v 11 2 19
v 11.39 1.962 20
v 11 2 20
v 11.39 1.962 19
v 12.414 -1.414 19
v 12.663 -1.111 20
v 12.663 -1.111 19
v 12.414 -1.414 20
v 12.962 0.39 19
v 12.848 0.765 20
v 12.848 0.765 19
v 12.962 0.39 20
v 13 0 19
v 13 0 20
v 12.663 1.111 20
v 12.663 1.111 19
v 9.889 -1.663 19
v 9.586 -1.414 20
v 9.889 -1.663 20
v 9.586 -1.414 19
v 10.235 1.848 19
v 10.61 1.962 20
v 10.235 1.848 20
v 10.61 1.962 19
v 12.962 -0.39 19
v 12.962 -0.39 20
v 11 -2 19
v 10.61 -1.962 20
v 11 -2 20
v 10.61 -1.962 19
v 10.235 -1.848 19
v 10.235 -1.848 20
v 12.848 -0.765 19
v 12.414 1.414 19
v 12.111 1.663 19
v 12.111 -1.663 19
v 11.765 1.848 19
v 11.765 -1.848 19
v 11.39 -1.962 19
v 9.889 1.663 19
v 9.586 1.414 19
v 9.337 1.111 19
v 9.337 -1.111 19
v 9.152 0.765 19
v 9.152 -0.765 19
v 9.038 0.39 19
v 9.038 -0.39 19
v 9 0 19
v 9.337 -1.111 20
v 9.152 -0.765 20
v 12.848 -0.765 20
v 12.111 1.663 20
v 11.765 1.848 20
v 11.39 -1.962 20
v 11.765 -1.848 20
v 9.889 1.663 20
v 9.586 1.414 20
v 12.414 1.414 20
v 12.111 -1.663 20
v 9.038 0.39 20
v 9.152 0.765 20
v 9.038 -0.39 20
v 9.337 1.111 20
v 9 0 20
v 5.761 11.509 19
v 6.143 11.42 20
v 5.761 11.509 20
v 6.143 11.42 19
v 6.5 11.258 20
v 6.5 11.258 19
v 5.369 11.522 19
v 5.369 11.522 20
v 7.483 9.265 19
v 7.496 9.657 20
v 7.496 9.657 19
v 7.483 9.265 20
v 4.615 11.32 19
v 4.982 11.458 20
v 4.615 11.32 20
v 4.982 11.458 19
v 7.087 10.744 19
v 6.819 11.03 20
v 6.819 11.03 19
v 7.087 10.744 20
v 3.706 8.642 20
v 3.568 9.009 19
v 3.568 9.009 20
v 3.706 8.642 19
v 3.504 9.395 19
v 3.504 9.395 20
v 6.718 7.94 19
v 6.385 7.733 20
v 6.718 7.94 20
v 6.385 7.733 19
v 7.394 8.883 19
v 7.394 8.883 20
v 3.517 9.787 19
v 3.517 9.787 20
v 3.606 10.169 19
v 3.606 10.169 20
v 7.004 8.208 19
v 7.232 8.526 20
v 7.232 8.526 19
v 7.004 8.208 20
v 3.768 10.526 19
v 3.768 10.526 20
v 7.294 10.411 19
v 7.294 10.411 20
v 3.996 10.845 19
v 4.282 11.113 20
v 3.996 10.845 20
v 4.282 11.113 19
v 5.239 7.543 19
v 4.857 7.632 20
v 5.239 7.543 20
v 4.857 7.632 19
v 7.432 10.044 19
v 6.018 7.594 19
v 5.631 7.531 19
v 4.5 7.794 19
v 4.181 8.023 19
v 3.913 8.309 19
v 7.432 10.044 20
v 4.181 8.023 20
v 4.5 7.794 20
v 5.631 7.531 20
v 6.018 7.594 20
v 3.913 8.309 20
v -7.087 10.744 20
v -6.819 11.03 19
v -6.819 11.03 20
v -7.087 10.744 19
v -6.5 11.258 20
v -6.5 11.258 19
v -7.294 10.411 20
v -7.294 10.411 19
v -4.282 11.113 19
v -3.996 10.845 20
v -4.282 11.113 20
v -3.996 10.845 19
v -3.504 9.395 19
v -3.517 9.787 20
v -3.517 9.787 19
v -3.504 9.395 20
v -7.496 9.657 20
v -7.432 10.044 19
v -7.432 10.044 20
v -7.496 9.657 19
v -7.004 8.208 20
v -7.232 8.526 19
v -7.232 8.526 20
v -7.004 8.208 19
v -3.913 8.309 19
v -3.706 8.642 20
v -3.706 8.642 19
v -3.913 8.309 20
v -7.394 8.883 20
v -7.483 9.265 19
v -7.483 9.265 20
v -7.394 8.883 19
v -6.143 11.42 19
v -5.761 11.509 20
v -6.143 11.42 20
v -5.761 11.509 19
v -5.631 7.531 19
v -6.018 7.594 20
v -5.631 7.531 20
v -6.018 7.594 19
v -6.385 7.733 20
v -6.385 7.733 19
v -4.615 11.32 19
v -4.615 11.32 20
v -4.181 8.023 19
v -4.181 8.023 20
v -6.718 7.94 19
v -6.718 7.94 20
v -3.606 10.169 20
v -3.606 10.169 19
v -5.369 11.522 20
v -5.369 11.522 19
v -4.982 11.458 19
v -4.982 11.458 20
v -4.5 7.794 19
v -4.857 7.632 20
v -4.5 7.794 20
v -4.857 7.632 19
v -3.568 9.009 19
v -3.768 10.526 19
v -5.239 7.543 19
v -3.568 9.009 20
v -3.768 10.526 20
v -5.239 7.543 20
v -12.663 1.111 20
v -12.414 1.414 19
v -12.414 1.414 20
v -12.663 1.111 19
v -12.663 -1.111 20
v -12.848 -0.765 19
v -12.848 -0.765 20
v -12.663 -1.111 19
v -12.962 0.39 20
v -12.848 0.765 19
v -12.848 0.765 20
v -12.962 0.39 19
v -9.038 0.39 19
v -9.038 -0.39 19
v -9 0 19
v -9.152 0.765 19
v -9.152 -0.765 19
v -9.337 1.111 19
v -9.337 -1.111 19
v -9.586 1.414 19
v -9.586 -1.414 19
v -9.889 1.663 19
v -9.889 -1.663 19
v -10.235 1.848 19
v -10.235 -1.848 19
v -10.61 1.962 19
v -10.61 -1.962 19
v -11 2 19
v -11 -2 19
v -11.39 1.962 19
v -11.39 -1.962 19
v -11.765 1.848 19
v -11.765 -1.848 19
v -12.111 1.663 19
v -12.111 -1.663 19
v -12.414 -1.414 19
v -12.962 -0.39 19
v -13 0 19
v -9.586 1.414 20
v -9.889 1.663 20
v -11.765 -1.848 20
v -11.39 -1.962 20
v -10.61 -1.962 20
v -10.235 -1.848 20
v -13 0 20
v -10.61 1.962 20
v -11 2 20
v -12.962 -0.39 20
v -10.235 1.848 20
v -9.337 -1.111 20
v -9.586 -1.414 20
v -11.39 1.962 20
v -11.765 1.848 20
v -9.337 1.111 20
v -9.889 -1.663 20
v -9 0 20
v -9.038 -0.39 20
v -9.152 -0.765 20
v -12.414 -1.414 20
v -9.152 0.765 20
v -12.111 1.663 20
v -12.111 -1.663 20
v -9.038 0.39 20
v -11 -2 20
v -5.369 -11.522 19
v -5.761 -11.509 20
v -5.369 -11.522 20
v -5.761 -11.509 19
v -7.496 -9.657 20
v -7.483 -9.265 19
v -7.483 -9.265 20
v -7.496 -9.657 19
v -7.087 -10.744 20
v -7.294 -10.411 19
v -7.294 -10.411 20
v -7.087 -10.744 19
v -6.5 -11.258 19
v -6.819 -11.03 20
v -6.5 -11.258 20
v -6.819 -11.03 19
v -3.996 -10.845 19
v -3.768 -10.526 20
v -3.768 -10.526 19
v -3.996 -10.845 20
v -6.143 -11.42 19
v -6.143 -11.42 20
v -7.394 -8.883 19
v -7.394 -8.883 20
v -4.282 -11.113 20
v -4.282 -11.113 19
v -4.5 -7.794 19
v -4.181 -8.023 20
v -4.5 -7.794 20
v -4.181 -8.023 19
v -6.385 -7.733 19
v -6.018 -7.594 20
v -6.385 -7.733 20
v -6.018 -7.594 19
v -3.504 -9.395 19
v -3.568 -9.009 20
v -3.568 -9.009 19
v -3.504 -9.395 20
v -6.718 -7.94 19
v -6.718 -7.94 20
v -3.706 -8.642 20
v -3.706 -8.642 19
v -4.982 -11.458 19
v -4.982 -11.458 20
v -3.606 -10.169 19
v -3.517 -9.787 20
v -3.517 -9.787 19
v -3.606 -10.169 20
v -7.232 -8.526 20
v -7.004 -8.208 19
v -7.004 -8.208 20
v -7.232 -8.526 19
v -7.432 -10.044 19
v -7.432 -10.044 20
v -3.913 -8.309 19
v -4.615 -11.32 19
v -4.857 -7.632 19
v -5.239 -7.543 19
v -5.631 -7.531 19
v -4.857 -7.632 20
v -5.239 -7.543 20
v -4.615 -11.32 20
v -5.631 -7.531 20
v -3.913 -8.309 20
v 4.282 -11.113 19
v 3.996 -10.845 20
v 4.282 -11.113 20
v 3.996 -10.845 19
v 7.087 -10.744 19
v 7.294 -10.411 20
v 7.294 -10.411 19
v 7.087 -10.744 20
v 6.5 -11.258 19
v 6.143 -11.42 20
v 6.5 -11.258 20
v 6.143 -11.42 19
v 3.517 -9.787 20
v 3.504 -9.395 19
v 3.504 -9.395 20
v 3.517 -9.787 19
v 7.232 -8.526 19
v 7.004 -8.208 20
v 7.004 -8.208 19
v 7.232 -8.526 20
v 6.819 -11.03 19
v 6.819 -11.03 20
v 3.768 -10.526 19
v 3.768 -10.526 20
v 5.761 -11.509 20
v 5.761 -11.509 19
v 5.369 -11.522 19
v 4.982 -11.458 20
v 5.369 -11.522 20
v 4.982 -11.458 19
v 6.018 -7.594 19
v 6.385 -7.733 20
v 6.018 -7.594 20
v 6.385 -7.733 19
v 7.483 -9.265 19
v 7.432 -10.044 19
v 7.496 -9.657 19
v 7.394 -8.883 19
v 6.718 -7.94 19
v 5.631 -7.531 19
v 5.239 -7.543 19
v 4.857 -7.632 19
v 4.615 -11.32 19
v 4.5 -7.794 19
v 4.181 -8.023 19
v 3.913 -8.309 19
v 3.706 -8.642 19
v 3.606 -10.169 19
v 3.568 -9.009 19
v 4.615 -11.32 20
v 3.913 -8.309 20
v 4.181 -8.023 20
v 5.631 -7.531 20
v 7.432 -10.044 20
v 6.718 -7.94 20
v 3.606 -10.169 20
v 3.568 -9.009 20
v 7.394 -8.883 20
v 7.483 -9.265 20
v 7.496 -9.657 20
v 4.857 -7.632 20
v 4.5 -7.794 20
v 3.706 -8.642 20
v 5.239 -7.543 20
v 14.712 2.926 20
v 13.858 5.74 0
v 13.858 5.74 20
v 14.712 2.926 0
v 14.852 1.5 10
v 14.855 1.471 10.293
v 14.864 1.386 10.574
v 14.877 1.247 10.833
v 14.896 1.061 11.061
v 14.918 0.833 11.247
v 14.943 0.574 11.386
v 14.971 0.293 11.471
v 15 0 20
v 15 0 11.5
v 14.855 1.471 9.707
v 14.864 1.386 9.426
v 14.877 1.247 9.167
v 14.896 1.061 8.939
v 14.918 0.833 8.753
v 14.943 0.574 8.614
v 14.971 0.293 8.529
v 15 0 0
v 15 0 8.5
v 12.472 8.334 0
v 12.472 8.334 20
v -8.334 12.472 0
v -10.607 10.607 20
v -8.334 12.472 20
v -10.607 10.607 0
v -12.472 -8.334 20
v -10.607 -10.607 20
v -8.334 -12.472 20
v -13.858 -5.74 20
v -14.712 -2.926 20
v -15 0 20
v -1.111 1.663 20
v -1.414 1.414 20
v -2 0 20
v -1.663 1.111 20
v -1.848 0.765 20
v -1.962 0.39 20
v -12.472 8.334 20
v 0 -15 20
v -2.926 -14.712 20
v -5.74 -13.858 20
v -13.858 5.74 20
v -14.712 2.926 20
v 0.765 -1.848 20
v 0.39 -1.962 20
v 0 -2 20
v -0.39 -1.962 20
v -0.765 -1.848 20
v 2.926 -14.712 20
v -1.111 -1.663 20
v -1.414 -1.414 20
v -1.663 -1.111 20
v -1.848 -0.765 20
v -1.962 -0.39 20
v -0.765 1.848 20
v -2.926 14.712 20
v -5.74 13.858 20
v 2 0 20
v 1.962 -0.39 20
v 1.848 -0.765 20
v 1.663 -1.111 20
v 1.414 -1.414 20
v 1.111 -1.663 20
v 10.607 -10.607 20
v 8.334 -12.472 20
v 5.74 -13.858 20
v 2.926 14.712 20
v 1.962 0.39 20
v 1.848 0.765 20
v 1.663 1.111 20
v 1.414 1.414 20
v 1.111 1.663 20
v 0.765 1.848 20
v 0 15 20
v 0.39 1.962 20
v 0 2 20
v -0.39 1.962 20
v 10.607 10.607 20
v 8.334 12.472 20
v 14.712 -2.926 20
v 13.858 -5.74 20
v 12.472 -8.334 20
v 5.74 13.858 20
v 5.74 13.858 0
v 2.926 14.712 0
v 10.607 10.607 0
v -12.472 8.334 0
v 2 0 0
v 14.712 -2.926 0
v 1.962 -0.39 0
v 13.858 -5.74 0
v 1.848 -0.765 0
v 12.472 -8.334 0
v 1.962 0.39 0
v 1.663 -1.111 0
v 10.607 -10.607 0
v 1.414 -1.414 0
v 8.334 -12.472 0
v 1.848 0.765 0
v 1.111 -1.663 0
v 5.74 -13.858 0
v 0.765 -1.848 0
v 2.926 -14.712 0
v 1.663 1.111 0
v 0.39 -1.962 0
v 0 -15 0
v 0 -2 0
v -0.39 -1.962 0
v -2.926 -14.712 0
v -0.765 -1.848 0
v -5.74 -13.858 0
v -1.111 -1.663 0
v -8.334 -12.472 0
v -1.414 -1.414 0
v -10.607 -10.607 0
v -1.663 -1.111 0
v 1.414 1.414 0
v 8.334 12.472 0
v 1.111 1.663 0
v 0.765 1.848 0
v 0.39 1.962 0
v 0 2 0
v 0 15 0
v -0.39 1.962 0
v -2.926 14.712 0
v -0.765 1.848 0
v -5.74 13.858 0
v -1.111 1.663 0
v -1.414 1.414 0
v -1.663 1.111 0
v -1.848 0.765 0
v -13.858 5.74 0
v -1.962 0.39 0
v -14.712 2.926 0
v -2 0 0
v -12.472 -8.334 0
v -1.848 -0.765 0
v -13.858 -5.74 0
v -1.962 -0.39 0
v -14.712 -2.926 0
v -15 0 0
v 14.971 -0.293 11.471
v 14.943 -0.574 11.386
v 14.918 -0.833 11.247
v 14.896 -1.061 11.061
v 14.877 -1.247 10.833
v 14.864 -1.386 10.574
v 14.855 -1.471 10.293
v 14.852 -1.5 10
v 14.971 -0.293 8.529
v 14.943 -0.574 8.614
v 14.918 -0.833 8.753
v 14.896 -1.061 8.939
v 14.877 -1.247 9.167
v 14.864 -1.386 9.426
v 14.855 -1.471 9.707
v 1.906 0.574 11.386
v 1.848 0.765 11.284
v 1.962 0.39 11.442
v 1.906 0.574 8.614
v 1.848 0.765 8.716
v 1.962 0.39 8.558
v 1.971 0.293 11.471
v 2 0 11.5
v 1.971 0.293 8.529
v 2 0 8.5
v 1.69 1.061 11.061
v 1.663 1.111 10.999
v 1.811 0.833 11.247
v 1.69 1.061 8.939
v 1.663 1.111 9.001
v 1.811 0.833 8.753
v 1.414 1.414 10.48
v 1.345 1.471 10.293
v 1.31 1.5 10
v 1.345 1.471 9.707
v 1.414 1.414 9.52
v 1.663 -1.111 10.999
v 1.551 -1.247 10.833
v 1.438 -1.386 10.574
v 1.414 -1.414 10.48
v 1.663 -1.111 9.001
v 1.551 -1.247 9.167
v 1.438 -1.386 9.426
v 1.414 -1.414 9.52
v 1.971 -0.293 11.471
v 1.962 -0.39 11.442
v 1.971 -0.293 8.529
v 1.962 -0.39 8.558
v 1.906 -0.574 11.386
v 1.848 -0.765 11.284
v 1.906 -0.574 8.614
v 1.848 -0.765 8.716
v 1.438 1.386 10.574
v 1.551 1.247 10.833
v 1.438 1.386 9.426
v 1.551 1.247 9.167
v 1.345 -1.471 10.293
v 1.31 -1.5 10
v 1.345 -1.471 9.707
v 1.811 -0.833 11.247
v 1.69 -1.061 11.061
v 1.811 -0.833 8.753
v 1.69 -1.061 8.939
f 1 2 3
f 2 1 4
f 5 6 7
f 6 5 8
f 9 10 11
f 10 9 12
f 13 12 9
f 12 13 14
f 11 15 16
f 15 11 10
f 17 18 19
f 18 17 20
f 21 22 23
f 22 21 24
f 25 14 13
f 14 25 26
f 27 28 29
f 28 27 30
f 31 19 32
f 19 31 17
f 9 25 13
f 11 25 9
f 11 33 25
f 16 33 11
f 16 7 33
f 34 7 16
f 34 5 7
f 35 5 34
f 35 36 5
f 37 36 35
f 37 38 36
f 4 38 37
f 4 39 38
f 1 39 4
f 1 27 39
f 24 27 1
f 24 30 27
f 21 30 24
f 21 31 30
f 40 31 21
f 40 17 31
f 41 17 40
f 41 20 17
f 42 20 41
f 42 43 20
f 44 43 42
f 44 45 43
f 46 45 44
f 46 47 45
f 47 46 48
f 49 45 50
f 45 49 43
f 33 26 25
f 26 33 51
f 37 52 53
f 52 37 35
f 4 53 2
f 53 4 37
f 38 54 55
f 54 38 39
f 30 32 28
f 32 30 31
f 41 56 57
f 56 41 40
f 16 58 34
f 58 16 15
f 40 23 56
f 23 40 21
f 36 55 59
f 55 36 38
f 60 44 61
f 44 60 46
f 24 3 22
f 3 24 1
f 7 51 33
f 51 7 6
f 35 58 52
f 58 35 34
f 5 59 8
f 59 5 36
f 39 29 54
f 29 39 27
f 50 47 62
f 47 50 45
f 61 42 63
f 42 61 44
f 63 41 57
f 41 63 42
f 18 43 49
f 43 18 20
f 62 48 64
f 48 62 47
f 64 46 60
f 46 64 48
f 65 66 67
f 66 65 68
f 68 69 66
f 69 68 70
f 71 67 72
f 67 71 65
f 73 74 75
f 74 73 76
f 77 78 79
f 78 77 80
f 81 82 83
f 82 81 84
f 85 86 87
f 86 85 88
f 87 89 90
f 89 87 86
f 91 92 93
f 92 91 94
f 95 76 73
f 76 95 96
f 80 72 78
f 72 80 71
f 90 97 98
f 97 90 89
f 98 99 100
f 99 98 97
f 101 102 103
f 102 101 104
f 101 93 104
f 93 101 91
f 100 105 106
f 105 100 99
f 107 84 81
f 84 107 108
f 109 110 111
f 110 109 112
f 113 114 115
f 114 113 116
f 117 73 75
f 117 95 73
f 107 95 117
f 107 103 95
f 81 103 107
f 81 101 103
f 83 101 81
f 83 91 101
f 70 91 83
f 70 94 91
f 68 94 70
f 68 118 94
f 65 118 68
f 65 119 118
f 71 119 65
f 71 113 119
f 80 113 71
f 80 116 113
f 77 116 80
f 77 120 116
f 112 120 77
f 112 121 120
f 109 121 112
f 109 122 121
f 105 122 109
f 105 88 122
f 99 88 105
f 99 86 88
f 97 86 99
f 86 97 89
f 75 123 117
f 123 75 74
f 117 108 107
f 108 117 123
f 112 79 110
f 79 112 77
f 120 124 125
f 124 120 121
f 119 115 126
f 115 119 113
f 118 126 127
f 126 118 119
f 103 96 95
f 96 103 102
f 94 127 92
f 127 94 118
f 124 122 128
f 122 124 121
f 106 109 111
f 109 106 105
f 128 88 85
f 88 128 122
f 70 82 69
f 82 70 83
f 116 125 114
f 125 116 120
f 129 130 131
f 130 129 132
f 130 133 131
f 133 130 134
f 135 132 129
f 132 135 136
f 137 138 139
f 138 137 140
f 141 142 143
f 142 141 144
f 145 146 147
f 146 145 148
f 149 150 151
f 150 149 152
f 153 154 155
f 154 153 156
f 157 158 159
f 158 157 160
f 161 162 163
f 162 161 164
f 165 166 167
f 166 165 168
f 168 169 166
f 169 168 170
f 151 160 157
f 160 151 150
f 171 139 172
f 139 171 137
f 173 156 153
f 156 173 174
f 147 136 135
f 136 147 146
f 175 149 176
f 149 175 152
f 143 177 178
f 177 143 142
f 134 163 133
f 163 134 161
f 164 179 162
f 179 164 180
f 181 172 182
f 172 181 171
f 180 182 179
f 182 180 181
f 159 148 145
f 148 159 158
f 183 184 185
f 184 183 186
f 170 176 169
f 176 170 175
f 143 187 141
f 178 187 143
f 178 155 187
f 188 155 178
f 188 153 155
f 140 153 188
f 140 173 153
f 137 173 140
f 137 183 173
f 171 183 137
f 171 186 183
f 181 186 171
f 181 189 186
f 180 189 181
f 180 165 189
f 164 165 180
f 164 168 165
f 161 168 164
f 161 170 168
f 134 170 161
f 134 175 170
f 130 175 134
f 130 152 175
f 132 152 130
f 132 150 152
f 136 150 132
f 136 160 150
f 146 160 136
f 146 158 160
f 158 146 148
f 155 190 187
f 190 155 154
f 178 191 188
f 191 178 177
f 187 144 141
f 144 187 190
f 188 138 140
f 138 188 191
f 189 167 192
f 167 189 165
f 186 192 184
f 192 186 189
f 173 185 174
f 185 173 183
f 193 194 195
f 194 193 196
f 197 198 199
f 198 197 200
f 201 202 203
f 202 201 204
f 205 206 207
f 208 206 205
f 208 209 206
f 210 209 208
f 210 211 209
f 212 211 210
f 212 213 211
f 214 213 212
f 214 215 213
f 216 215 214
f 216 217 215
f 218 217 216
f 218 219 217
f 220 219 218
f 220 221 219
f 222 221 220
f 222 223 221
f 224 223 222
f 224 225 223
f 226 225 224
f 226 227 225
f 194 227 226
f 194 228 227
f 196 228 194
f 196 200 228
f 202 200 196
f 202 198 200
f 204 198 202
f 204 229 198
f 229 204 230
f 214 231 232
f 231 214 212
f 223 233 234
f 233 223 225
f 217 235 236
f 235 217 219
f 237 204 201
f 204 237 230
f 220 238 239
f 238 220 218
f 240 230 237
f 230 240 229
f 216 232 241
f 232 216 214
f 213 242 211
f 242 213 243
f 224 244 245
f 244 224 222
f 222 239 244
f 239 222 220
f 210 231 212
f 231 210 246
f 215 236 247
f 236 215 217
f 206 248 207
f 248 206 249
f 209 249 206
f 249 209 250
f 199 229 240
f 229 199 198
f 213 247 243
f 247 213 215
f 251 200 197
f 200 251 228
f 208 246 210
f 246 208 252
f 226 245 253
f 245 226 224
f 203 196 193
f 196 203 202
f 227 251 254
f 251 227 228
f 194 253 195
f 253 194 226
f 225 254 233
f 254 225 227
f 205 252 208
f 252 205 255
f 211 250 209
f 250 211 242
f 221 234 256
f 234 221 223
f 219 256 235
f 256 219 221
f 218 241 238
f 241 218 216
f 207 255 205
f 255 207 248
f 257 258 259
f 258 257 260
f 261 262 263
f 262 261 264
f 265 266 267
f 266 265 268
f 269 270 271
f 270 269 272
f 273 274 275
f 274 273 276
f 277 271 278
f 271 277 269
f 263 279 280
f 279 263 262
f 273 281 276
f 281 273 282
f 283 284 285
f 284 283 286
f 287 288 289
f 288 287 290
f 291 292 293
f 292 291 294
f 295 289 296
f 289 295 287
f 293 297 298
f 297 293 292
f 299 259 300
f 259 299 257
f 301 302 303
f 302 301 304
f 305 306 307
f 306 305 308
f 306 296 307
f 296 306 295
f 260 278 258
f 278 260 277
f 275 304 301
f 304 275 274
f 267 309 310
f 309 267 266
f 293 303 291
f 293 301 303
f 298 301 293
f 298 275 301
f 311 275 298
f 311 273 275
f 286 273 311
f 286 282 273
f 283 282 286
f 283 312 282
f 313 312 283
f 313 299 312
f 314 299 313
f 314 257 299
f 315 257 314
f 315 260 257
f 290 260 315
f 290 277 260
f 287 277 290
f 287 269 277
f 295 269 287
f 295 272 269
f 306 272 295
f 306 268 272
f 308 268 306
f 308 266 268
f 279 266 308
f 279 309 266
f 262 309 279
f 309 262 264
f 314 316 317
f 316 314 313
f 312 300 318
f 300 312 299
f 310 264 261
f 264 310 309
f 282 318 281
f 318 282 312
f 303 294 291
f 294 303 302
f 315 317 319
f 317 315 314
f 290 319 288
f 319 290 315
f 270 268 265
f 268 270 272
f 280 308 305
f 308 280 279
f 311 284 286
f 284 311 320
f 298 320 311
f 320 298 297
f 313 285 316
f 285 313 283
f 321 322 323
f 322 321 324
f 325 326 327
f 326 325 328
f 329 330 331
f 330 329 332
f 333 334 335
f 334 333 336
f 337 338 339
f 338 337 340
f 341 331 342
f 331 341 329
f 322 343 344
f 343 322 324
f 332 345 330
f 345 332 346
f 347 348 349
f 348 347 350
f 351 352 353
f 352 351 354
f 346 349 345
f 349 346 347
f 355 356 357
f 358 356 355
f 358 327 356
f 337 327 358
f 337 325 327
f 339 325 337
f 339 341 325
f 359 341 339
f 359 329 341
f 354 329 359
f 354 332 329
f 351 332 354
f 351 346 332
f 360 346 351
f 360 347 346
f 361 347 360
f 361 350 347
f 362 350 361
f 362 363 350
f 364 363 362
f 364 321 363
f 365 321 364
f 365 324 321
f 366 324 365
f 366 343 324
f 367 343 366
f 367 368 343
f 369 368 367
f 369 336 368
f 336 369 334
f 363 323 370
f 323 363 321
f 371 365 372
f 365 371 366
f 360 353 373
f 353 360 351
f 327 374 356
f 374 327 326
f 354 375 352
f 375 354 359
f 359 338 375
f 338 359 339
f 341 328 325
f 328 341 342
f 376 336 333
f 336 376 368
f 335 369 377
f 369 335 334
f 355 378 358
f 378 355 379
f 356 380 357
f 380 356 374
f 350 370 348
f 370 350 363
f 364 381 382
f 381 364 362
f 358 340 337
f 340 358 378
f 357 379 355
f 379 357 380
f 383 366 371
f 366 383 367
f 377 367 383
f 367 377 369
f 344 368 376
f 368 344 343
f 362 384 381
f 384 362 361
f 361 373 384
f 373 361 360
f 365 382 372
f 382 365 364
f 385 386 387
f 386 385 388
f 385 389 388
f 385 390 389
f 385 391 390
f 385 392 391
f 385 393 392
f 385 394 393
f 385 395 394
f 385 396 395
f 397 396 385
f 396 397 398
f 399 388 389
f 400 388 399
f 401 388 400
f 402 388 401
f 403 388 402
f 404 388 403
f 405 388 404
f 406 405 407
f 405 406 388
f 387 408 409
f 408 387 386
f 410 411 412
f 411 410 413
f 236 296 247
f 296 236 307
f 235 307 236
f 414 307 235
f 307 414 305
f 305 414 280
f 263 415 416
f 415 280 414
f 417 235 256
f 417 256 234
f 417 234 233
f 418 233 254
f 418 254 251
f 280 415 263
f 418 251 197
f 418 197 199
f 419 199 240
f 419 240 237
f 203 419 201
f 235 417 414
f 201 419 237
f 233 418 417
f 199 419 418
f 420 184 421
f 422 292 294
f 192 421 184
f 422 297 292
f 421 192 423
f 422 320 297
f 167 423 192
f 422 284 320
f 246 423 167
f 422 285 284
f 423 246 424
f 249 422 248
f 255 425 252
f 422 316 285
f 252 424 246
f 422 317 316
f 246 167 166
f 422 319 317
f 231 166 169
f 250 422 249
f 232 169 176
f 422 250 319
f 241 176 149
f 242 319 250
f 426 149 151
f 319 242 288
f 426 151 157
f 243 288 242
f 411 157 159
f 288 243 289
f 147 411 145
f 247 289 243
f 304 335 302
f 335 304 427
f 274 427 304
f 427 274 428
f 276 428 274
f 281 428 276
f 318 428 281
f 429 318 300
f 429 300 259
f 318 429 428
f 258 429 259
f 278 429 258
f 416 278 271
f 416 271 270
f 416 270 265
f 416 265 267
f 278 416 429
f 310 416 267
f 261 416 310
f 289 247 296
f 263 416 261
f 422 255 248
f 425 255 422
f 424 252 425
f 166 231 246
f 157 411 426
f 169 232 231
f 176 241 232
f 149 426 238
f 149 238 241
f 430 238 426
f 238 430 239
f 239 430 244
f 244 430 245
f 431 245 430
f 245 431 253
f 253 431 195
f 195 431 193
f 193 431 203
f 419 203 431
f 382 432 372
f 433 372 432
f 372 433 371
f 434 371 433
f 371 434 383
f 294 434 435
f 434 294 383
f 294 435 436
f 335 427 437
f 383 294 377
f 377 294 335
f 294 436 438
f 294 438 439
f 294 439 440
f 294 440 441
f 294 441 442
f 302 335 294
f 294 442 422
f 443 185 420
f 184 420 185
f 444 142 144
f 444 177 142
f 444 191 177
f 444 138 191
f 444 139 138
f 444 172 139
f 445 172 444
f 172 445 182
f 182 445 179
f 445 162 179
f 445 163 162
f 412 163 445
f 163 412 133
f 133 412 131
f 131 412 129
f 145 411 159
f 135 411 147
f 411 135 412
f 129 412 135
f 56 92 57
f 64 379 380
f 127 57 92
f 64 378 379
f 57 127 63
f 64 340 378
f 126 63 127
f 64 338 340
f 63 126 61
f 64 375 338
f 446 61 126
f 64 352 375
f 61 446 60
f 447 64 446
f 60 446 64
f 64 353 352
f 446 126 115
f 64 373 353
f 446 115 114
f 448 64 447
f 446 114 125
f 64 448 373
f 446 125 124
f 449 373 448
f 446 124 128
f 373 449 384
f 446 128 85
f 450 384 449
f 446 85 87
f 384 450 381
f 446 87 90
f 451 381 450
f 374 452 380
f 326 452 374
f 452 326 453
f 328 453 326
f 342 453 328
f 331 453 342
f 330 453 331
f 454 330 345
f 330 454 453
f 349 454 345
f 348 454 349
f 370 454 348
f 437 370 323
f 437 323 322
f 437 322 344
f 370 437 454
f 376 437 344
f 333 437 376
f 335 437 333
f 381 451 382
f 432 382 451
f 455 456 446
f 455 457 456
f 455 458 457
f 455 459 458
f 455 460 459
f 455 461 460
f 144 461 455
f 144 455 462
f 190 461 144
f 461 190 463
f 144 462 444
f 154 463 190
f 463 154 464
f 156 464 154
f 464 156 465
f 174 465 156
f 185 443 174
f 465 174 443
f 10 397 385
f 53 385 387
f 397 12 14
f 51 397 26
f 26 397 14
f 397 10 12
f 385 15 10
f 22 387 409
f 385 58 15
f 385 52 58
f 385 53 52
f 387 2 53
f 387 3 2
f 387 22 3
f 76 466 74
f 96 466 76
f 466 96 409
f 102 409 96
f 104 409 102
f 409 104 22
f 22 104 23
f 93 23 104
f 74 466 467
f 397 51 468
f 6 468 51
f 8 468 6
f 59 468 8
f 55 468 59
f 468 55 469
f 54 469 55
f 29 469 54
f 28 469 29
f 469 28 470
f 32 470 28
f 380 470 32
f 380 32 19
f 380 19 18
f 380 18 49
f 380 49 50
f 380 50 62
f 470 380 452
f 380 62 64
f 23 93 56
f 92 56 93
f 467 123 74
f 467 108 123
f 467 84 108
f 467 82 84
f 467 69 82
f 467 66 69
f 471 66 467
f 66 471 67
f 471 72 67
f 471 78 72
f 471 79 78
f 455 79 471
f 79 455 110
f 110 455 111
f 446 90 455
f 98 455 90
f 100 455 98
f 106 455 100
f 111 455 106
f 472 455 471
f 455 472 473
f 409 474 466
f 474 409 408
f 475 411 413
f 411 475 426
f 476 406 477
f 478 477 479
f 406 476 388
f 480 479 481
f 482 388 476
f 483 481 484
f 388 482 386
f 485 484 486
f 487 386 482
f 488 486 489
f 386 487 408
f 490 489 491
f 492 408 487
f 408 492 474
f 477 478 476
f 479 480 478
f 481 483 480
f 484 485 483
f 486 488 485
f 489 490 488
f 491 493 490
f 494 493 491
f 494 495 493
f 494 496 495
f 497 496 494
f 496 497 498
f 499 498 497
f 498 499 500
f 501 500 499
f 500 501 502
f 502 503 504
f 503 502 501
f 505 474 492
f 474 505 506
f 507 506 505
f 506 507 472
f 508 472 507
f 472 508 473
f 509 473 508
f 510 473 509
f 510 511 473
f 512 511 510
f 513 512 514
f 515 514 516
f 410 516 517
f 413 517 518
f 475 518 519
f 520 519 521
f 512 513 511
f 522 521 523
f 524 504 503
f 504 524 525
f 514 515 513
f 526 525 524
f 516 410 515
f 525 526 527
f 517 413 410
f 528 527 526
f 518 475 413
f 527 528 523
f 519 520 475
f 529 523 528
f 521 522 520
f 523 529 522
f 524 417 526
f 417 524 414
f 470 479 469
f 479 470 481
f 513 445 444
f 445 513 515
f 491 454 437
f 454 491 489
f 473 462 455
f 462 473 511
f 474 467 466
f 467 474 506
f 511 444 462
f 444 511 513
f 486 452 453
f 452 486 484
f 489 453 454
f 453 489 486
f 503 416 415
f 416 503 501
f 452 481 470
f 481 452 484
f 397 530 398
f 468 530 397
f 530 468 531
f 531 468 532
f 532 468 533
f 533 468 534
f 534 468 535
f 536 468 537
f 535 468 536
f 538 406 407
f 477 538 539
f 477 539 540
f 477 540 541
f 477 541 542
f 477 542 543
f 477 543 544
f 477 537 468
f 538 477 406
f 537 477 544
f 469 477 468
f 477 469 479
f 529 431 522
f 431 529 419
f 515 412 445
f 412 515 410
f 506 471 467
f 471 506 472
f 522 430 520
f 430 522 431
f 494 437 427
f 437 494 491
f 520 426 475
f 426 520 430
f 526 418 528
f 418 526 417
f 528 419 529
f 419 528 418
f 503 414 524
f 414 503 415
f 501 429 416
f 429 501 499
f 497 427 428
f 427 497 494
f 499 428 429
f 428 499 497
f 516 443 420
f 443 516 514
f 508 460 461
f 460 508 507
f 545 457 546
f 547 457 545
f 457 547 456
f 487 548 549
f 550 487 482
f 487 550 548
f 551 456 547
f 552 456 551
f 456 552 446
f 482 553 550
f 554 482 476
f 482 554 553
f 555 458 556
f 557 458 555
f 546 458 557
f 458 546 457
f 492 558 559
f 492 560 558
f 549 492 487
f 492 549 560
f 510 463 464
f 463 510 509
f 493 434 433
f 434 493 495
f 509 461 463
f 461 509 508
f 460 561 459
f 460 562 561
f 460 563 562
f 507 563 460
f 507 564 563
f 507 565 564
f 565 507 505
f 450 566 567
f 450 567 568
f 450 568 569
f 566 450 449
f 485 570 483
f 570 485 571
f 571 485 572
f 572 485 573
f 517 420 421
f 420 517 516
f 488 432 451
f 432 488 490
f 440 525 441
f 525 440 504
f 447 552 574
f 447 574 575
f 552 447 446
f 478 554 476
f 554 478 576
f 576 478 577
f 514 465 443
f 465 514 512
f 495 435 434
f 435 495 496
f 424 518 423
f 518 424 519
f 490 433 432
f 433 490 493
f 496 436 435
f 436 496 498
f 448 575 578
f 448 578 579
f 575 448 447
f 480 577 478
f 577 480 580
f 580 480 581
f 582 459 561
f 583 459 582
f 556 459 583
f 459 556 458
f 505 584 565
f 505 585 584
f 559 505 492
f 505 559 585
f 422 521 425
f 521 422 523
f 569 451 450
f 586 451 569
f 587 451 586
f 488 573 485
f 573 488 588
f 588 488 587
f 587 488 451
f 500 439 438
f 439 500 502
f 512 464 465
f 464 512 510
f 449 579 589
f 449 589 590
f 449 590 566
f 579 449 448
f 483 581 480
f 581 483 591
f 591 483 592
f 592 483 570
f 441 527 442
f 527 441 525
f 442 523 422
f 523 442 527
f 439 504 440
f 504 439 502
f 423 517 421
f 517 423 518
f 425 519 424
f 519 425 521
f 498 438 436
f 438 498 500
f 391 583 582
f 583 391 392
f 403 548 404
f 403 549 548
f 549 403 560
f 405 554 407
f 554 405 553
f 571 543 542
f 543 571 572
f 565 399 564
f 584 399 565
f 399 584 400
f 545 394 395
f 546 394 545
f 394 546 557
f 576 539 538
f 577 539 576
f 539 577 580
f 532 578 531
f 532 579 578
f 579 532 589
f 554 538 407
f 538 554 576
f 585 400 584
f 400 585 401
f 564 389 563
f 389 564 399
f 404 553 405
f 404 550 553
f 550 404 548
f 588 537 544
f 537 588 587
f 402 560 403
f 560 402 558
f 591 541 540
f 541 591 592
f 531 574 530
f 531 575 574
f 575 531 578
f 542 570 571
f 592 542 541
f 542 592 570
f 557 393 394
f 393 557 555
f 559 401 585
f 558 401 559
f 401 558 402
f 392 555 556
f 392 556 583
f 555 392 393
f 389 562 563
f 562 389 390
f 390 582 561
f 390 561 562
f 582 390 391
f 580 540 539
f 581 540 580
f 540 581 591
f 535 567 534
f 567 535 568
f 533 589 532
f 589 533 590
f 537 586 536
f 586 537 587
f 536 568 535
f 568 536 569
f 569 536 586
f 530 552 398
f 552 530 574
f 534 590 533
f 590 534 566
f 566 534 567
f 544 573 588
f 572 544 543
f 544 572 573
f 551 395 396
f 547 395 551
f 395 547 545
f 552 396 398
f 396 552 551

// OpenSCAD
$fn = 32;

// ----------------------------------------------------------------------
// Control knob: dimpled knob
// ----------------------------------------------------------------------

// --- parameters (mm) ---
dimp_d = 4;               // finger dimple diameter
n_dimp = 6;               // number of dimples
dimp_r = 11;              // dimple ring radius
knob_d = 30;              // knob body diameter
knob_h = 20;              // knob body height
bore_d = 4;               // shaft bore diameter
set_d = 3;                // set screw bore diameter

dimp_step = 360 / n_dimp;  // dimple angular step

difference() {
  cylinder(h = knob_h, d = knob_d);
  translate([0, 0, -1]) cylinder(h = knob_h + 2, d = bore_d);
  translate([-1, 0, knob_h / 2]) rotate([0, 90, 0])
    cylinder(h = knob_d / 2 + bore_d / 2 + 2, d = set_d);  for (i = [0 : n_dimp - 1])
    rotate([0, 0, i * dimp_step])
      translate([dimp_r, 0, knob_h - 1])
        cylinder(h = 2, d = dimp_d);
}
